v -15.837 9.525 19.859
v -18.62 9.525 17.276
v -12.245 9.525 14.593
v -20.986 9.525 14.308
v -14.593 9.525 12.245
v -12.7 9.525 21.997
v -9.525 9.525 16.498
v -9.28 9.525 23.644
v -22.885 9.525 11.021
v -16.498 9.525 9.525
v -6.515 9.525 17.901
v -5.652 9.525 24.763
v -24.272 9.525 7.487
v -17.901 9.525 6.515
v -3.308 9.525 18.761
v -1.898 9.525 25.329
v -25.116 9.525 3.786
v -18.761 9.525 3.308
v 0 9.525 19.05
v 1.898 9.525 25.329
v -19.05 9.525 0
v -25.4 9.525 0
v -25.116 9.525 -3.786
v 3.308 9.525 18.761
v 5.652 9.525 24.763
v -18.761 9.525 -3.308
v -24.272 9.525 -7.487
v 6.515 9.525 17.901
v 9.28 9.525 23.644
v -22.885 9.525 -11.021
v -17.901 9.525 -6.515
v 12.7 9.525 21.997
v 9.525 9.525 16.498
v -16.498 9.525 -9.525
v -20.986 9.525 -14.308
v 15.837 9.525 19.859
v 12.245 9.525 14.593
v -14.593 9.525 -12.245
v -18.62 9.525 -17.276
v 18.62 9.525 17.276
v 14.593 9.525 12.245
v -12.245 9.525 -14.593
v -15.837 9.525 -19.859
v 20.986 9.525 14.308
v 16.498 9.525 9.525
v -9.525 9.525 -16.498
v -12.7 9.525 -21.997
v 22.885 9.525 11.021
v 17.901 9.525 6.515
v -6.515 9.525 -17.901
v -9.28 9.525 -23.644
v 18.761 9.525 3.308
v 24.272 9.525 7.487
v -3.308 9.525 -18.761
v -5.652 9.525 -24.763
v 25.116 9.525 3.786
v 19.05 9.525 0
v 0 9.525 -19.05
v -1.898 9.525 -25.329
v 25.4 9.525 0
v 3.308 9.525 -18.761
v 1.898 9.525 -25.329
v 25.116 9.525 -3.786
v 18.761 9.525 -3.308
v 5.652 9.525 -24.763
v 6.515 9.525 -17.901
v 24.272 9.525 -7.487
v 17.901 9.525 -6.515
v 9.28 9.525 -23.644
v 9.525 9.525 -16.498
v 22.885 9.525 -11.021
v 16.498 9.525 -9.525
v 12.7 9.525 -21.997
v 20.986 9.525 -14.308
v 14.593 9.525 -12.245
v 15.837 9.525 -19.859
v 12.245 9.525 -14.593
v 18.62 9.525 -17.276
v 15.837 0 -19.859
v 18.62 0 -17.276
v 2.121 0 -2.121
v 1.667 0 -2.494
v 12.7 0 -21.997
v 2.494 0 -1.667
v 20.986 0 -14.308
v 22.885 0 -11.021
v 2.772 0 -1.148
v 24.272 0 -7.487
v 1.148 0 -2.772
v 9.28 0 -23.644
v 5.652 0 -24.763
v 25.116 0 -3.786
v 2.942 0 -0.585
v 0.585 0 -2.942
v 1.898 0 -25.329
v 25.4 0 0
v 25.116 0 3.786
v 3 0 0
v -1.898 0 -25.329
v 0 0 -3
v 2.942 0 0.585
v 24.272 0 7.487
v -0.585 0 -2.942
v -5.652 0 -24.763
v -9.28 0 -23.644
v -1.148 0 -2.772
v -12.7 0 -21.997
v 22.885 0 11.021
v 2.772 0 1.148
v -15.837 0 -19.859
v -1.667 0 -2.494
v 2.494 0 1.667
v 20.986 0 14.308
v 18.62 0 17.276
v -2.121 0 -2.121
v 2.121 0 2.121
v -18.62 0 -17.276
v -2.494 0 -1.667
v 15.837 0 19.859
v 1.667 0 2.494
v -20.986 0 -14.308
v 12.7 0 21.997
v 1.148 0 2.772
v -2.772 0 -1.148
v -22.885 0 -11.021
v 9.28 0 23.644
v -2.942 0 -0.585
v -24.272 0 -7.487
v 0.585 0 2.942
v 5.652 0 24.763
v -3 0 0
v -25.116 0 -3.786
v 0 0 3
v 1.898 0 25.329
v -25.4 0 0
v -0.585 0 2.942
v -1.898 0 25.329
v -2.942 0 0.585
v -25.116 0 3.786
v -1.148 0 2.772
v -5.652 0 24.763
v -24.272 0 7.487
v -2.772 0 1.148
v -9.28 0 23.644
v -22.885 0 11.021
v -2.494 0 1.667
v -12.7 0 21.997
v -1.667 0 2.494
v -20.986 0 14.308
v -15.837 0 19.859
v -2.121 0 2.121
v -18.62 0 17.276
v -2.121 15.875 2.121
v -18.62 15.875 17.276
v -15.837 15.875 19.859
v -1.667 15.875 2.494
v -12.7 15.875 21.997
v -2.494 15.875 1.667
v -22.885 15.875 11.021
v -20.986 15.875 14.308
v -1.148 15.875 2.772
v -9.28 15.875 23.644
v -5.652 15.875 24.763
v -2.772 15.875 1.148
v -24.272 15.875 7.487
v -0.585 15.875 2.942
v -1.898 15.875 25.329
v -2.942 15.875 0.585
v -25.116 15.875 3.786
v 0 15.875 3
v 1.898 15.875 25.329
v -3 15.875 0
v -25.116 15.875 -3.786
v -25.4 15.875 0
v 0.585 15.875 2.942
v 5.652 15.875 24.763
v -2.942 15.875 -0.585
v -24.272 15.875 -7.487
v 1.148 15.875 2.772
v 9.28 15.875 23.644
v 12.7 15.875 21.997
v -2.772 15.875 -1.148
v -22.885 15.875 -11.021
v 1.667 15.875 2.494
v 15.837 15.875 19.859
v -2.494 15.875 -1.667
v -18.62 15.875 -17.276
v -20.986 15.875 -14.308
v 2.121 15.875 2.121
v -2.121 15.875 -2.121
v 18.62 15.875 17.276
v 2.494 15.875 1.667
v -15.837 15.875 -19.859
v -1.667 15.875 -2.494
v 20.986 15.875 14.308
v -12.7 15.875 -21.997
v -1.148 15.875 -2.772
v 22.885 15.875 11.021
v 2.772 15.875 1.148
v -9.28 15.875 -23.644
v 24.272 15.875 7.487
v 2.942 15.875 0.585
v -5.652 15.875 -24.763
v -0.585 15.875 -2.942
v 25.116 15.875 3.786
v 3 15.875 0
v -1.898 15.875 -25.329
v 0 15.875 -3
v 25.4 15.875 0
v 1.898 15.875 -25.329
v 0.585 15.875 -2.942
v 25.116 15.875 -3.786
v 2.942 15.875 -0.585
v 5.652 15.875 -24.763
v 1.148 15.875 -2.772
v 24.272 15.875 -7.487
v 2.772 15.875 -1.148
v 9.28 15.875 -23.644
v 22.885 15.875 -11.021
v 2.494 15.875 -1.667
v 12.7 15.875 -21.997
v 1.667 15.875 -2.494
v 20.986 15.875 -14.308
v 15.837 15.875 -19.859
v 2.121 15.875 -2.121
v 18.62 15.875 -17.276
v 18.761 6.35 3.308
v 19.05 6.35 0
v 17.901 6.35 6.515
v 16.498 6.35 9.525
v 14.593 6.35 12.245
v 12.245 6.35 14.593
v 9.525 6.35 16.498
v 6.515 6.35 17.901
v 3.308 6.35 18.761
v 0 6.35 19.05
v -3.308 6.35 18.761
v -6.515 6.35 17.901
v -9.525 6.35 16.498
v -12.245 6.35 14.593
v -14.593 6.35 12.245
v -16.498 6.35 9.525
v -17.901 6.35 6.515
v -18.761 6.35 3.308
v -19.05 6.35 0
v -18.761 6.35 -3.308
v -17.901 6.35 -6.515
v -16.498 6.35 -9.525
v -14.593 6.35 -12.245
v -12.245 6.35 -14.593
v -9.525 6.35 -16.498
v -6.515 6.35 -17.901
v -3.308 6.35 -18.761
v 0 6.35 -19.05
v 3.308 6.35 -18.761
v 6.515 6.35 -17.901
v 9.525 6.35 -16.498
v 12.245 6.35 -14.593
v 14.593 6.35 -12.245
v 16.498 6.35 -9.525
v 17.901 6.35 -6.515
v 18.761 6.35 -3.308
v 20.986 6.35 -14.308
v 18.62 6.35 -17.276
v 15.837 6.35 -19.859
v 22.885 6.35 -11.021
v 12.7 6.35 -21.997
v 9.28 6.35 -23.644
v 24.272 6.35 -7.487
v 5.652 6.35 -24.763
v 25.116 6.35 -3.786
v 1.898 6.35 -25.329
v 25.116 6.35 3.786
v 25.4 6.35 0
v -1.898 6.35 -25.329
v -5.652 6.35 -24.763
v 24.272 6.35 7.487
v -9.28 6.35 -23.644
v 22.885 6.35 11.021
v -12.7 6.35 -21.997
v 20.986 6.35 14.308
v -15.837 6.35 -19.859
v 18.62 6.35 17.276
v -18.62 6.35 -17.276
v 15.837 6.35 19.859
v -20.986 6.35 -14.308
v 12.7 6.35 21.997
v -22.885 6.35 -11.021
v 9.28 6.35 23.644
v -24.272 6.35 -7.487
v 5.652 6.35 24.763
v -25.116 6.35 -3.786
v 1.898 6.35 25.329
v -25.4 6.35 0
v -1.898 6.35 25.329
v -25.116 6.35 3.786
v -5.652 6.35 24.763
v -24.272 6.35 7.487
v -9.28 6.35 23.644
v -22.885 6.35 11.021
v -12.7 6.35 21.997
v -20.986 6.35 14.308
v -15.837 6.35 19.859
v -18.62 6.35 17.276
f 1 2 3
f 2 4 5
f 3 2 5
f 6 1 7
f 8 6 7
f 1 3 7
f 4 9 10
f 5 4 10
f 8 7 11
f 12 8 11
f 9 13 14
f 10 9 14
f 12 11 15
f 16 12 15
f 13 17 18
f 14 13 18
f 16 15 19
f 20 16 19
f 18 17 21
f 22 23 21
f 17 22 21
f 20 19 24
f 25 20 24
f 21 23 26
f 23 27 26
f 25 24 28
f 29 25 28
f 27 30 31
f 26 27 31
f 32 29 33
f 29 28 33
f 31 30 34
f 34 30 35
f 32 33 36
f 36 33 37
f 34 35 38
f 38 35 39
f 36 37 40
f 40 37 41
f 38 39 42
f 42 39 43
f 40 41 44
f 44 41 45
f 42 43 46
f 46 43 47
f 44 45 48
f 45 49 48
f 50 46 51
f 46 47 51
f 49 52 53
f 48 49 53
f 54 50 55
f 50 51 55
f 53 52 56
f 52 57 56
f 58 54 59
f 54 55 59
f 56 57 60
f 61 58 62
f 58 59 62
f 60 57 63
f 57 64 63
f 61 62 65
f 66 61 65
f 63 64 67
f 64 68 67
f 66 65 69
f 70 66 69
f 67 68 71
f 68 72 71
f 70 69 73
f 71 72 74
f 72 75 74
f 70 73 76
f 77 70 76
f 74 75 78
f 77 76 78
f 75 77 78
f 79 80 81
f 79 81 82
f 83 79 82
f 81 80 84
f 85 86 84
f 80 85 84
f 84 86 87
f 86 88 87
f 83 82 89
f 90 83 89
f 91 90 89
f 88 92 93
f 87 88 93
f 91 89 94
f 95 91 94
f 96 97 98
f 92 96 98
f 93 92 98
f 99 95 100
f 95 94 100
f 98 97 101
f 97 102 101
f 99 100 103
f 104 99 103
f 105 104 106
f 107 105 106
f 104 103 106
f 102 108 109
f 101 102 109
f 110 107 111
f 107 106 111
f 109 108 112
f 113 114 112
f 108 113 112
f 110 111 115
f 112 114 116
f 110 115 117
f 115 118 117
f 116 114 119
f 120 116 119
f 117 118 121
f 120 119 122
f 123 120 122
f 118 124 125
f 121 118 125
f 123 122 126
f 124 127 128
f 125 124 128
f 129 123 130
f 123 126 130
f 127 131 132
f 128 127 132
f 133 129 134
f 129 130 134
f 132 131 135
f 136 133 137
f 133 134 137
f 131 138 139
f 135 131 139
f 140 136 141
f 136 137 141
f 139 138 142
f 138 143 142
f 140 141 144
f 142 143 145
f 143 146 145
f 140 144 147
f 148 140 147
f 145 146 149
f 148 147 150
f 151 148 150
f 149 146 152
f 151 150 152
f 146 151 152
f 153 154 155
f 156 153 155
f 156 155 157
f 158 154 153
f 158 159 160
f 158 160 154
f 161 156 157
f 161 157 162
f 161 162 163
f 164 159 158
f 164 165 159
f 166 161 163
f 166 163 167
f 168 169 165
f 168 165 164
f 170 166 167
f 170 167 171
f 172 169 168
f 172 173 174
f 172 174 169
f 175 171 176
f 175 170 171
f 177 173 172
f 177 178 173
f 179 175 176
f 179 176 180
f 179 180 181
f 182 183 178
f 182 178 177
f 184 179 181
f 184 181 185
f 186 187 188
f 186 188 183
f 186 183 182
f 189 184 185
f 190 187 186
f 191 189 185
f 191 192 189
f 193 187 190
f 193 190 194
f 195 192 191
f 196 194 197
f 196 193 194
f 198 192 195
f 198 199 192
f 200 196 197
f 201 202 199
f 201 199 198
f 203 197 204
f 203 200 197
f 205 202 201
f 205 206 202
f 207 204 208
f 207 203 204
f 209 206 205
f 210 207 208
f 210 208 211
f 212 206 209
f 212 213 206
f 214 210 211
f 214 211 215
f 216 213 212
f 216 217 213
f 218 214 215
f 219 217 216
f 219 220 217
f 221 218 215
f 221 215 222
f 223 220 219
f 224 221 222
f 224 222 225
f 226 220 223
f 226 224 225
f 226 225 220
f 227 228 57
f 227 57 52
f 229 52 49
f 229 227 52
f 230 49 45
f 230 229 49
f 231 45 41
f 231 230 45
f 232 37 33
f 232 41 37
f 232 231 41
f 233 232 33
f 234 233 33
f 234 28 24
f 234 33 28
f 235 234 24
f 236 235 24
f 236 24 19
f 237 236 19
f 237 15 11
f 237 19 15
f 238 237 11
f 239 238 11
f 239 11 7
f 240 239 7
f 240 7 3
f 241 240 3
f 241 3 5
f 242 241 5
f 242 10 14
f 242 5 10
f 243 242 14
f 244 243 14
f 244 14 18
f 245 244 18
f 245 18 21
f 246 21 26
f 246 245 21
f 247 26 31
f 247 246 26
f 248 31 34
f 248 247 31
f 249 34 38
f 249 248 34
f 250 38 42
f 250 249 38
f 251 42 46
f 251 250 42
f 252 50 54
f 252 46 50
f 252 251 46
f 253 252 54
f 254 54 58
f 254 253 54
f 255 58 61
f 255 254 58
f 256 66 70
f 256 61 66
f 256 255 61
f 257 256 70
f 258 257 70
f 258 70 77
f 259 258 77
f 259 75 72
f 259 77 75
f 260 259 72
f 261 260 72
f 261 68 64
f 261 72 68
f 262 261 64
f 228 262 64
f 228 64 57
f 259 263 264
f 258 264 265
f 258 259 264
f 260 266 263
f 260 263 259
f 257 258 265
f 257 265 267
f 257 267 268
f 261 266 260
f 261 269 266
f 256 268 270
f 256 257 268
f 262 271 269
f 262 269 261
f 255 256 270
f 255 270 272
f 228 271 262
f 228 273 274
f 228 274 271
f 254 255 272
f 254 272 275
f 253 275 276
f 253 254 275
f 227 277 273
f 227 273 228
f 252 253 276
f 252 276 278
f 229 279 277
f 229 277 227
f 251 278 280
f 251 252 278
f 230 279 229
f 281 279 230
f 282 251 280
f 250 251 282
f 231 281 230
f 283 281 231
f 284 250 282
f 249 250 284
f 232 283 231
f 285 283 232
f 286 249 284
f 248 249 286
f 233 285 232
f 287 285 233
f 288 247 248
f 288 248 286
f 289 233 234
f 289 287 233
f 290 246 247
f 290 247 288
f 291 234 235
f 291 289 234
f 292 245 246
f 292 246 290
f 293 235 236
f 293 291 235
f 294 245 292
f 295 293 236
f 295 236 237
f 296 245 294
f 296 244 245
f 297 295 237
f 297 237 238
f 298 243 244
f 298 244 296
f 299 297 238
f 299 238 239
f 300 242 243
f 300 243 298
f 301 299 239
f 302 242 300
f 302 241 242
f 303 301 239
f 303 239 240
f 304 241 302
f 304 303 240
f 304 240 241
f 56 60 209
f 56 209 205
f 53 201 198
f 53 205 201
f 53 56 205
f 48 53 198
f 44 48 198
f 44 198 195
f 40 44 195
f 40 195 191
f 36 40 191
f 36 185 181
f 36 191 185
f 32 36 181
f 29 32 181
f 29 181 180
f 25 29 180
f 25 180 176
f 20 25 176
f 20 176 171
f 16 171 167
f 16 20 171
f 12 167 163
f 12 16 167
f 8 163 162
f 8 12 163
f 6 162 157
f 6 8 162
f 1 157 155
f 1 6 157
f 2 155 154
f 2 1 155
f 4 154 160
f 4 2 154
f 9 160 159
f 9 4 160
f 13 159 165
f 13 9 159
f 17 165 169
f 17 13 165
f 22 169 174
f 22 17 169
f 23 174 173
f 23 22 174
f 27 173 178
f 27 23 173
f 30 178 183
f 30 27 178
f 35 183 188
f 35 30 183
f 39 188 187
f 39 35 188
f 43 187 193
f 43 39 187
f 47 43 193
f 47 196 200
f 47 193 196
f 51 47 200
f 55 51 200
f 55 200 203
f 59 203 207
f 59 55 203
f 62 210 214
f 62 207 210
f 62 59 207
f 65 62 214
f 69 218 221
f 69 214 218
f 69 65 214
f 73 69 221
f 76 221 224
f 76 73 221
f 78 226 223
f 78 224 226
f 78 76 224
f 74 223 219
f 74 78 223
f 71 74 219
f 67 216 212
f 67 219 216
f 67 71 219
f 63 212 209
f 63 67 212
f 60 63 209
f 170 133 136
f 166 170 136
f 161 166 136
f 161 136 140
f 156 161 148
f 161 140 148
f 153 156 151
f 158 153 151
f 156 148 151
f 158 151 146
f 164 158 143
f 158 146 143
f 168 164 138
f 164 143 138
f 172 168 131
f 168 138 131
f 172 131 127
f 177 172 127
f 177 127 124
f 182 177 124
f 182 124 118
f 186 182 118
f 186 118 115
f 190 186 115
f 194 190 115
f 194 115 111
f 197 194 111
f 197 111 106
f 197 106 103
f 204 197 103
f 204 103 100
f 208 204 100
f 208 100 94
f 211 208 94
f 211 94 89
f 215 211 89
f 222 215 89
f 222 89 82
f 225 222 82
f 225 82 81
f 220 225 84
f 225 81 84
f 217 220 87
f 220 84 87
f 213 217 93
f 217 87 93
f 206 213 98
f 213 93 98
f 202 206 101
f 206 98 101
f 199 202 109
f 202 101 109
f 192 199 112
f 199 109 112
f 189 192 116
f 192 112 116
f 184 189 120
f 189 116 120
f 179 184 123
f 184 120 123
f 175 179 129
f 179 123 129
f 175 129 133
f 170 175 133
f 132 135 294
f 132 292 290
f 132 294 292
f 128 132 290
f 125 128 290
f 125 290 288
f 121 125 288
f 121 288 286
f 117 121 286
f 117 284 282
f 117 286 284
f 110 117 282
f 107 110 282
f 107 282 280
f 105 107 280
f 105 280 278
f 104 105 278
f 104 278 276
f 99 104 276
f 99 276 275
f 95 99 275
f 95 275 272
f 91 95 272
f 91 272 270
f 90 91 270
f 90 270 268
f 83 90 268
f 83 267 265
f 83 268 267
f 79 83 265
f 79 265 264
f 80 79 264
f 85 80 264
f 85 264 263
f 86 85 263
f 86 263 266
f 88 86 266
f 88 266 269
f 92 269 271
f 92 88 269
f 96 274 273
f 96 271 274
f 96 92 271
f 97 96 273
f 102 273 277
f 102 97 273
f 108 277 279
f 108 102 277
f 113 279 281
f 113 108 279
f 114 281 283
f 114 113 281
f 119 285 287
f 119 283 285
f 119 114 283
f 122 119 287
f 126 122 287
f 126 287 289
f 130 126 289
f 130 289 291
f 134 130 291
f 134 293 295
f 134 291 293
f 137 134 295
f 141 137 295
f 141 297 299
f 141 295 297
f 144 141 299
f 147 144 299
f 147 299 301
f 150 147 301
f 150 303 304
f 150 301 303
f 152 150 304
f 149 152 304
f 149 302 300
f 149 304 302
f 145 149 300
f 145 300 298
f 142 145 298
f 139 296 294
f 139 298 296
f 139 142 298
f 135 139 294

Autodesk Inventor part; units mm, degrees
ref_plane "YZ Plane" through (0, 0, 0) normal (1, 0, 0) x (0, 1, 0)
ref_plane "XZ Plane" through (0, 0, 0) normal (0, 1, 0) x (-1, 0, 0)
ref_plane "XY Plane" through (0, 0, 0) normal (0, 0, 1) x (1, 0, 0)
sketch "Sketch1" plane through (0, 0, 0) normal (0, 1, 0) x (-1, 0, 0)
  circle A0 centre (0, 0) radius 25.4
  dimension "d0" = 50.8
extrude "Extrusion1" add sketch "Sketch1" along normal blind 6.35
sketch "Sketch2" plane through (0, 6.35, 0) normal (0, 1, 0) x (1, 0, 0)
  circle A0 centre (0, 0) radius 19.05
  dimension "d3" = 38.1
extrude "Extrusion2" add sketch "Sketch2" along normal blind 3.175
sketch "Sketch3" plane through (0, 9.525, 0) normal (0, 1, 0) x (1, 0, 0)
  circle A0 centre (0, 0) radius 25.4
extrude "Extrusion3" add sketch "Sketch3" along normal blind 6.35
sketch "Sketch5" plane through (0, 15.875, 0) normal (0, 1, 0) x (1, 0, 0)
  circle A0 centre (0, 0) radius 3
  dimension "d10" = 6
hole "Hole1" at (0, 15.875, 0) direction (0, -1, 0) diameter 6 end through all
properties part number "Wheel_design"
